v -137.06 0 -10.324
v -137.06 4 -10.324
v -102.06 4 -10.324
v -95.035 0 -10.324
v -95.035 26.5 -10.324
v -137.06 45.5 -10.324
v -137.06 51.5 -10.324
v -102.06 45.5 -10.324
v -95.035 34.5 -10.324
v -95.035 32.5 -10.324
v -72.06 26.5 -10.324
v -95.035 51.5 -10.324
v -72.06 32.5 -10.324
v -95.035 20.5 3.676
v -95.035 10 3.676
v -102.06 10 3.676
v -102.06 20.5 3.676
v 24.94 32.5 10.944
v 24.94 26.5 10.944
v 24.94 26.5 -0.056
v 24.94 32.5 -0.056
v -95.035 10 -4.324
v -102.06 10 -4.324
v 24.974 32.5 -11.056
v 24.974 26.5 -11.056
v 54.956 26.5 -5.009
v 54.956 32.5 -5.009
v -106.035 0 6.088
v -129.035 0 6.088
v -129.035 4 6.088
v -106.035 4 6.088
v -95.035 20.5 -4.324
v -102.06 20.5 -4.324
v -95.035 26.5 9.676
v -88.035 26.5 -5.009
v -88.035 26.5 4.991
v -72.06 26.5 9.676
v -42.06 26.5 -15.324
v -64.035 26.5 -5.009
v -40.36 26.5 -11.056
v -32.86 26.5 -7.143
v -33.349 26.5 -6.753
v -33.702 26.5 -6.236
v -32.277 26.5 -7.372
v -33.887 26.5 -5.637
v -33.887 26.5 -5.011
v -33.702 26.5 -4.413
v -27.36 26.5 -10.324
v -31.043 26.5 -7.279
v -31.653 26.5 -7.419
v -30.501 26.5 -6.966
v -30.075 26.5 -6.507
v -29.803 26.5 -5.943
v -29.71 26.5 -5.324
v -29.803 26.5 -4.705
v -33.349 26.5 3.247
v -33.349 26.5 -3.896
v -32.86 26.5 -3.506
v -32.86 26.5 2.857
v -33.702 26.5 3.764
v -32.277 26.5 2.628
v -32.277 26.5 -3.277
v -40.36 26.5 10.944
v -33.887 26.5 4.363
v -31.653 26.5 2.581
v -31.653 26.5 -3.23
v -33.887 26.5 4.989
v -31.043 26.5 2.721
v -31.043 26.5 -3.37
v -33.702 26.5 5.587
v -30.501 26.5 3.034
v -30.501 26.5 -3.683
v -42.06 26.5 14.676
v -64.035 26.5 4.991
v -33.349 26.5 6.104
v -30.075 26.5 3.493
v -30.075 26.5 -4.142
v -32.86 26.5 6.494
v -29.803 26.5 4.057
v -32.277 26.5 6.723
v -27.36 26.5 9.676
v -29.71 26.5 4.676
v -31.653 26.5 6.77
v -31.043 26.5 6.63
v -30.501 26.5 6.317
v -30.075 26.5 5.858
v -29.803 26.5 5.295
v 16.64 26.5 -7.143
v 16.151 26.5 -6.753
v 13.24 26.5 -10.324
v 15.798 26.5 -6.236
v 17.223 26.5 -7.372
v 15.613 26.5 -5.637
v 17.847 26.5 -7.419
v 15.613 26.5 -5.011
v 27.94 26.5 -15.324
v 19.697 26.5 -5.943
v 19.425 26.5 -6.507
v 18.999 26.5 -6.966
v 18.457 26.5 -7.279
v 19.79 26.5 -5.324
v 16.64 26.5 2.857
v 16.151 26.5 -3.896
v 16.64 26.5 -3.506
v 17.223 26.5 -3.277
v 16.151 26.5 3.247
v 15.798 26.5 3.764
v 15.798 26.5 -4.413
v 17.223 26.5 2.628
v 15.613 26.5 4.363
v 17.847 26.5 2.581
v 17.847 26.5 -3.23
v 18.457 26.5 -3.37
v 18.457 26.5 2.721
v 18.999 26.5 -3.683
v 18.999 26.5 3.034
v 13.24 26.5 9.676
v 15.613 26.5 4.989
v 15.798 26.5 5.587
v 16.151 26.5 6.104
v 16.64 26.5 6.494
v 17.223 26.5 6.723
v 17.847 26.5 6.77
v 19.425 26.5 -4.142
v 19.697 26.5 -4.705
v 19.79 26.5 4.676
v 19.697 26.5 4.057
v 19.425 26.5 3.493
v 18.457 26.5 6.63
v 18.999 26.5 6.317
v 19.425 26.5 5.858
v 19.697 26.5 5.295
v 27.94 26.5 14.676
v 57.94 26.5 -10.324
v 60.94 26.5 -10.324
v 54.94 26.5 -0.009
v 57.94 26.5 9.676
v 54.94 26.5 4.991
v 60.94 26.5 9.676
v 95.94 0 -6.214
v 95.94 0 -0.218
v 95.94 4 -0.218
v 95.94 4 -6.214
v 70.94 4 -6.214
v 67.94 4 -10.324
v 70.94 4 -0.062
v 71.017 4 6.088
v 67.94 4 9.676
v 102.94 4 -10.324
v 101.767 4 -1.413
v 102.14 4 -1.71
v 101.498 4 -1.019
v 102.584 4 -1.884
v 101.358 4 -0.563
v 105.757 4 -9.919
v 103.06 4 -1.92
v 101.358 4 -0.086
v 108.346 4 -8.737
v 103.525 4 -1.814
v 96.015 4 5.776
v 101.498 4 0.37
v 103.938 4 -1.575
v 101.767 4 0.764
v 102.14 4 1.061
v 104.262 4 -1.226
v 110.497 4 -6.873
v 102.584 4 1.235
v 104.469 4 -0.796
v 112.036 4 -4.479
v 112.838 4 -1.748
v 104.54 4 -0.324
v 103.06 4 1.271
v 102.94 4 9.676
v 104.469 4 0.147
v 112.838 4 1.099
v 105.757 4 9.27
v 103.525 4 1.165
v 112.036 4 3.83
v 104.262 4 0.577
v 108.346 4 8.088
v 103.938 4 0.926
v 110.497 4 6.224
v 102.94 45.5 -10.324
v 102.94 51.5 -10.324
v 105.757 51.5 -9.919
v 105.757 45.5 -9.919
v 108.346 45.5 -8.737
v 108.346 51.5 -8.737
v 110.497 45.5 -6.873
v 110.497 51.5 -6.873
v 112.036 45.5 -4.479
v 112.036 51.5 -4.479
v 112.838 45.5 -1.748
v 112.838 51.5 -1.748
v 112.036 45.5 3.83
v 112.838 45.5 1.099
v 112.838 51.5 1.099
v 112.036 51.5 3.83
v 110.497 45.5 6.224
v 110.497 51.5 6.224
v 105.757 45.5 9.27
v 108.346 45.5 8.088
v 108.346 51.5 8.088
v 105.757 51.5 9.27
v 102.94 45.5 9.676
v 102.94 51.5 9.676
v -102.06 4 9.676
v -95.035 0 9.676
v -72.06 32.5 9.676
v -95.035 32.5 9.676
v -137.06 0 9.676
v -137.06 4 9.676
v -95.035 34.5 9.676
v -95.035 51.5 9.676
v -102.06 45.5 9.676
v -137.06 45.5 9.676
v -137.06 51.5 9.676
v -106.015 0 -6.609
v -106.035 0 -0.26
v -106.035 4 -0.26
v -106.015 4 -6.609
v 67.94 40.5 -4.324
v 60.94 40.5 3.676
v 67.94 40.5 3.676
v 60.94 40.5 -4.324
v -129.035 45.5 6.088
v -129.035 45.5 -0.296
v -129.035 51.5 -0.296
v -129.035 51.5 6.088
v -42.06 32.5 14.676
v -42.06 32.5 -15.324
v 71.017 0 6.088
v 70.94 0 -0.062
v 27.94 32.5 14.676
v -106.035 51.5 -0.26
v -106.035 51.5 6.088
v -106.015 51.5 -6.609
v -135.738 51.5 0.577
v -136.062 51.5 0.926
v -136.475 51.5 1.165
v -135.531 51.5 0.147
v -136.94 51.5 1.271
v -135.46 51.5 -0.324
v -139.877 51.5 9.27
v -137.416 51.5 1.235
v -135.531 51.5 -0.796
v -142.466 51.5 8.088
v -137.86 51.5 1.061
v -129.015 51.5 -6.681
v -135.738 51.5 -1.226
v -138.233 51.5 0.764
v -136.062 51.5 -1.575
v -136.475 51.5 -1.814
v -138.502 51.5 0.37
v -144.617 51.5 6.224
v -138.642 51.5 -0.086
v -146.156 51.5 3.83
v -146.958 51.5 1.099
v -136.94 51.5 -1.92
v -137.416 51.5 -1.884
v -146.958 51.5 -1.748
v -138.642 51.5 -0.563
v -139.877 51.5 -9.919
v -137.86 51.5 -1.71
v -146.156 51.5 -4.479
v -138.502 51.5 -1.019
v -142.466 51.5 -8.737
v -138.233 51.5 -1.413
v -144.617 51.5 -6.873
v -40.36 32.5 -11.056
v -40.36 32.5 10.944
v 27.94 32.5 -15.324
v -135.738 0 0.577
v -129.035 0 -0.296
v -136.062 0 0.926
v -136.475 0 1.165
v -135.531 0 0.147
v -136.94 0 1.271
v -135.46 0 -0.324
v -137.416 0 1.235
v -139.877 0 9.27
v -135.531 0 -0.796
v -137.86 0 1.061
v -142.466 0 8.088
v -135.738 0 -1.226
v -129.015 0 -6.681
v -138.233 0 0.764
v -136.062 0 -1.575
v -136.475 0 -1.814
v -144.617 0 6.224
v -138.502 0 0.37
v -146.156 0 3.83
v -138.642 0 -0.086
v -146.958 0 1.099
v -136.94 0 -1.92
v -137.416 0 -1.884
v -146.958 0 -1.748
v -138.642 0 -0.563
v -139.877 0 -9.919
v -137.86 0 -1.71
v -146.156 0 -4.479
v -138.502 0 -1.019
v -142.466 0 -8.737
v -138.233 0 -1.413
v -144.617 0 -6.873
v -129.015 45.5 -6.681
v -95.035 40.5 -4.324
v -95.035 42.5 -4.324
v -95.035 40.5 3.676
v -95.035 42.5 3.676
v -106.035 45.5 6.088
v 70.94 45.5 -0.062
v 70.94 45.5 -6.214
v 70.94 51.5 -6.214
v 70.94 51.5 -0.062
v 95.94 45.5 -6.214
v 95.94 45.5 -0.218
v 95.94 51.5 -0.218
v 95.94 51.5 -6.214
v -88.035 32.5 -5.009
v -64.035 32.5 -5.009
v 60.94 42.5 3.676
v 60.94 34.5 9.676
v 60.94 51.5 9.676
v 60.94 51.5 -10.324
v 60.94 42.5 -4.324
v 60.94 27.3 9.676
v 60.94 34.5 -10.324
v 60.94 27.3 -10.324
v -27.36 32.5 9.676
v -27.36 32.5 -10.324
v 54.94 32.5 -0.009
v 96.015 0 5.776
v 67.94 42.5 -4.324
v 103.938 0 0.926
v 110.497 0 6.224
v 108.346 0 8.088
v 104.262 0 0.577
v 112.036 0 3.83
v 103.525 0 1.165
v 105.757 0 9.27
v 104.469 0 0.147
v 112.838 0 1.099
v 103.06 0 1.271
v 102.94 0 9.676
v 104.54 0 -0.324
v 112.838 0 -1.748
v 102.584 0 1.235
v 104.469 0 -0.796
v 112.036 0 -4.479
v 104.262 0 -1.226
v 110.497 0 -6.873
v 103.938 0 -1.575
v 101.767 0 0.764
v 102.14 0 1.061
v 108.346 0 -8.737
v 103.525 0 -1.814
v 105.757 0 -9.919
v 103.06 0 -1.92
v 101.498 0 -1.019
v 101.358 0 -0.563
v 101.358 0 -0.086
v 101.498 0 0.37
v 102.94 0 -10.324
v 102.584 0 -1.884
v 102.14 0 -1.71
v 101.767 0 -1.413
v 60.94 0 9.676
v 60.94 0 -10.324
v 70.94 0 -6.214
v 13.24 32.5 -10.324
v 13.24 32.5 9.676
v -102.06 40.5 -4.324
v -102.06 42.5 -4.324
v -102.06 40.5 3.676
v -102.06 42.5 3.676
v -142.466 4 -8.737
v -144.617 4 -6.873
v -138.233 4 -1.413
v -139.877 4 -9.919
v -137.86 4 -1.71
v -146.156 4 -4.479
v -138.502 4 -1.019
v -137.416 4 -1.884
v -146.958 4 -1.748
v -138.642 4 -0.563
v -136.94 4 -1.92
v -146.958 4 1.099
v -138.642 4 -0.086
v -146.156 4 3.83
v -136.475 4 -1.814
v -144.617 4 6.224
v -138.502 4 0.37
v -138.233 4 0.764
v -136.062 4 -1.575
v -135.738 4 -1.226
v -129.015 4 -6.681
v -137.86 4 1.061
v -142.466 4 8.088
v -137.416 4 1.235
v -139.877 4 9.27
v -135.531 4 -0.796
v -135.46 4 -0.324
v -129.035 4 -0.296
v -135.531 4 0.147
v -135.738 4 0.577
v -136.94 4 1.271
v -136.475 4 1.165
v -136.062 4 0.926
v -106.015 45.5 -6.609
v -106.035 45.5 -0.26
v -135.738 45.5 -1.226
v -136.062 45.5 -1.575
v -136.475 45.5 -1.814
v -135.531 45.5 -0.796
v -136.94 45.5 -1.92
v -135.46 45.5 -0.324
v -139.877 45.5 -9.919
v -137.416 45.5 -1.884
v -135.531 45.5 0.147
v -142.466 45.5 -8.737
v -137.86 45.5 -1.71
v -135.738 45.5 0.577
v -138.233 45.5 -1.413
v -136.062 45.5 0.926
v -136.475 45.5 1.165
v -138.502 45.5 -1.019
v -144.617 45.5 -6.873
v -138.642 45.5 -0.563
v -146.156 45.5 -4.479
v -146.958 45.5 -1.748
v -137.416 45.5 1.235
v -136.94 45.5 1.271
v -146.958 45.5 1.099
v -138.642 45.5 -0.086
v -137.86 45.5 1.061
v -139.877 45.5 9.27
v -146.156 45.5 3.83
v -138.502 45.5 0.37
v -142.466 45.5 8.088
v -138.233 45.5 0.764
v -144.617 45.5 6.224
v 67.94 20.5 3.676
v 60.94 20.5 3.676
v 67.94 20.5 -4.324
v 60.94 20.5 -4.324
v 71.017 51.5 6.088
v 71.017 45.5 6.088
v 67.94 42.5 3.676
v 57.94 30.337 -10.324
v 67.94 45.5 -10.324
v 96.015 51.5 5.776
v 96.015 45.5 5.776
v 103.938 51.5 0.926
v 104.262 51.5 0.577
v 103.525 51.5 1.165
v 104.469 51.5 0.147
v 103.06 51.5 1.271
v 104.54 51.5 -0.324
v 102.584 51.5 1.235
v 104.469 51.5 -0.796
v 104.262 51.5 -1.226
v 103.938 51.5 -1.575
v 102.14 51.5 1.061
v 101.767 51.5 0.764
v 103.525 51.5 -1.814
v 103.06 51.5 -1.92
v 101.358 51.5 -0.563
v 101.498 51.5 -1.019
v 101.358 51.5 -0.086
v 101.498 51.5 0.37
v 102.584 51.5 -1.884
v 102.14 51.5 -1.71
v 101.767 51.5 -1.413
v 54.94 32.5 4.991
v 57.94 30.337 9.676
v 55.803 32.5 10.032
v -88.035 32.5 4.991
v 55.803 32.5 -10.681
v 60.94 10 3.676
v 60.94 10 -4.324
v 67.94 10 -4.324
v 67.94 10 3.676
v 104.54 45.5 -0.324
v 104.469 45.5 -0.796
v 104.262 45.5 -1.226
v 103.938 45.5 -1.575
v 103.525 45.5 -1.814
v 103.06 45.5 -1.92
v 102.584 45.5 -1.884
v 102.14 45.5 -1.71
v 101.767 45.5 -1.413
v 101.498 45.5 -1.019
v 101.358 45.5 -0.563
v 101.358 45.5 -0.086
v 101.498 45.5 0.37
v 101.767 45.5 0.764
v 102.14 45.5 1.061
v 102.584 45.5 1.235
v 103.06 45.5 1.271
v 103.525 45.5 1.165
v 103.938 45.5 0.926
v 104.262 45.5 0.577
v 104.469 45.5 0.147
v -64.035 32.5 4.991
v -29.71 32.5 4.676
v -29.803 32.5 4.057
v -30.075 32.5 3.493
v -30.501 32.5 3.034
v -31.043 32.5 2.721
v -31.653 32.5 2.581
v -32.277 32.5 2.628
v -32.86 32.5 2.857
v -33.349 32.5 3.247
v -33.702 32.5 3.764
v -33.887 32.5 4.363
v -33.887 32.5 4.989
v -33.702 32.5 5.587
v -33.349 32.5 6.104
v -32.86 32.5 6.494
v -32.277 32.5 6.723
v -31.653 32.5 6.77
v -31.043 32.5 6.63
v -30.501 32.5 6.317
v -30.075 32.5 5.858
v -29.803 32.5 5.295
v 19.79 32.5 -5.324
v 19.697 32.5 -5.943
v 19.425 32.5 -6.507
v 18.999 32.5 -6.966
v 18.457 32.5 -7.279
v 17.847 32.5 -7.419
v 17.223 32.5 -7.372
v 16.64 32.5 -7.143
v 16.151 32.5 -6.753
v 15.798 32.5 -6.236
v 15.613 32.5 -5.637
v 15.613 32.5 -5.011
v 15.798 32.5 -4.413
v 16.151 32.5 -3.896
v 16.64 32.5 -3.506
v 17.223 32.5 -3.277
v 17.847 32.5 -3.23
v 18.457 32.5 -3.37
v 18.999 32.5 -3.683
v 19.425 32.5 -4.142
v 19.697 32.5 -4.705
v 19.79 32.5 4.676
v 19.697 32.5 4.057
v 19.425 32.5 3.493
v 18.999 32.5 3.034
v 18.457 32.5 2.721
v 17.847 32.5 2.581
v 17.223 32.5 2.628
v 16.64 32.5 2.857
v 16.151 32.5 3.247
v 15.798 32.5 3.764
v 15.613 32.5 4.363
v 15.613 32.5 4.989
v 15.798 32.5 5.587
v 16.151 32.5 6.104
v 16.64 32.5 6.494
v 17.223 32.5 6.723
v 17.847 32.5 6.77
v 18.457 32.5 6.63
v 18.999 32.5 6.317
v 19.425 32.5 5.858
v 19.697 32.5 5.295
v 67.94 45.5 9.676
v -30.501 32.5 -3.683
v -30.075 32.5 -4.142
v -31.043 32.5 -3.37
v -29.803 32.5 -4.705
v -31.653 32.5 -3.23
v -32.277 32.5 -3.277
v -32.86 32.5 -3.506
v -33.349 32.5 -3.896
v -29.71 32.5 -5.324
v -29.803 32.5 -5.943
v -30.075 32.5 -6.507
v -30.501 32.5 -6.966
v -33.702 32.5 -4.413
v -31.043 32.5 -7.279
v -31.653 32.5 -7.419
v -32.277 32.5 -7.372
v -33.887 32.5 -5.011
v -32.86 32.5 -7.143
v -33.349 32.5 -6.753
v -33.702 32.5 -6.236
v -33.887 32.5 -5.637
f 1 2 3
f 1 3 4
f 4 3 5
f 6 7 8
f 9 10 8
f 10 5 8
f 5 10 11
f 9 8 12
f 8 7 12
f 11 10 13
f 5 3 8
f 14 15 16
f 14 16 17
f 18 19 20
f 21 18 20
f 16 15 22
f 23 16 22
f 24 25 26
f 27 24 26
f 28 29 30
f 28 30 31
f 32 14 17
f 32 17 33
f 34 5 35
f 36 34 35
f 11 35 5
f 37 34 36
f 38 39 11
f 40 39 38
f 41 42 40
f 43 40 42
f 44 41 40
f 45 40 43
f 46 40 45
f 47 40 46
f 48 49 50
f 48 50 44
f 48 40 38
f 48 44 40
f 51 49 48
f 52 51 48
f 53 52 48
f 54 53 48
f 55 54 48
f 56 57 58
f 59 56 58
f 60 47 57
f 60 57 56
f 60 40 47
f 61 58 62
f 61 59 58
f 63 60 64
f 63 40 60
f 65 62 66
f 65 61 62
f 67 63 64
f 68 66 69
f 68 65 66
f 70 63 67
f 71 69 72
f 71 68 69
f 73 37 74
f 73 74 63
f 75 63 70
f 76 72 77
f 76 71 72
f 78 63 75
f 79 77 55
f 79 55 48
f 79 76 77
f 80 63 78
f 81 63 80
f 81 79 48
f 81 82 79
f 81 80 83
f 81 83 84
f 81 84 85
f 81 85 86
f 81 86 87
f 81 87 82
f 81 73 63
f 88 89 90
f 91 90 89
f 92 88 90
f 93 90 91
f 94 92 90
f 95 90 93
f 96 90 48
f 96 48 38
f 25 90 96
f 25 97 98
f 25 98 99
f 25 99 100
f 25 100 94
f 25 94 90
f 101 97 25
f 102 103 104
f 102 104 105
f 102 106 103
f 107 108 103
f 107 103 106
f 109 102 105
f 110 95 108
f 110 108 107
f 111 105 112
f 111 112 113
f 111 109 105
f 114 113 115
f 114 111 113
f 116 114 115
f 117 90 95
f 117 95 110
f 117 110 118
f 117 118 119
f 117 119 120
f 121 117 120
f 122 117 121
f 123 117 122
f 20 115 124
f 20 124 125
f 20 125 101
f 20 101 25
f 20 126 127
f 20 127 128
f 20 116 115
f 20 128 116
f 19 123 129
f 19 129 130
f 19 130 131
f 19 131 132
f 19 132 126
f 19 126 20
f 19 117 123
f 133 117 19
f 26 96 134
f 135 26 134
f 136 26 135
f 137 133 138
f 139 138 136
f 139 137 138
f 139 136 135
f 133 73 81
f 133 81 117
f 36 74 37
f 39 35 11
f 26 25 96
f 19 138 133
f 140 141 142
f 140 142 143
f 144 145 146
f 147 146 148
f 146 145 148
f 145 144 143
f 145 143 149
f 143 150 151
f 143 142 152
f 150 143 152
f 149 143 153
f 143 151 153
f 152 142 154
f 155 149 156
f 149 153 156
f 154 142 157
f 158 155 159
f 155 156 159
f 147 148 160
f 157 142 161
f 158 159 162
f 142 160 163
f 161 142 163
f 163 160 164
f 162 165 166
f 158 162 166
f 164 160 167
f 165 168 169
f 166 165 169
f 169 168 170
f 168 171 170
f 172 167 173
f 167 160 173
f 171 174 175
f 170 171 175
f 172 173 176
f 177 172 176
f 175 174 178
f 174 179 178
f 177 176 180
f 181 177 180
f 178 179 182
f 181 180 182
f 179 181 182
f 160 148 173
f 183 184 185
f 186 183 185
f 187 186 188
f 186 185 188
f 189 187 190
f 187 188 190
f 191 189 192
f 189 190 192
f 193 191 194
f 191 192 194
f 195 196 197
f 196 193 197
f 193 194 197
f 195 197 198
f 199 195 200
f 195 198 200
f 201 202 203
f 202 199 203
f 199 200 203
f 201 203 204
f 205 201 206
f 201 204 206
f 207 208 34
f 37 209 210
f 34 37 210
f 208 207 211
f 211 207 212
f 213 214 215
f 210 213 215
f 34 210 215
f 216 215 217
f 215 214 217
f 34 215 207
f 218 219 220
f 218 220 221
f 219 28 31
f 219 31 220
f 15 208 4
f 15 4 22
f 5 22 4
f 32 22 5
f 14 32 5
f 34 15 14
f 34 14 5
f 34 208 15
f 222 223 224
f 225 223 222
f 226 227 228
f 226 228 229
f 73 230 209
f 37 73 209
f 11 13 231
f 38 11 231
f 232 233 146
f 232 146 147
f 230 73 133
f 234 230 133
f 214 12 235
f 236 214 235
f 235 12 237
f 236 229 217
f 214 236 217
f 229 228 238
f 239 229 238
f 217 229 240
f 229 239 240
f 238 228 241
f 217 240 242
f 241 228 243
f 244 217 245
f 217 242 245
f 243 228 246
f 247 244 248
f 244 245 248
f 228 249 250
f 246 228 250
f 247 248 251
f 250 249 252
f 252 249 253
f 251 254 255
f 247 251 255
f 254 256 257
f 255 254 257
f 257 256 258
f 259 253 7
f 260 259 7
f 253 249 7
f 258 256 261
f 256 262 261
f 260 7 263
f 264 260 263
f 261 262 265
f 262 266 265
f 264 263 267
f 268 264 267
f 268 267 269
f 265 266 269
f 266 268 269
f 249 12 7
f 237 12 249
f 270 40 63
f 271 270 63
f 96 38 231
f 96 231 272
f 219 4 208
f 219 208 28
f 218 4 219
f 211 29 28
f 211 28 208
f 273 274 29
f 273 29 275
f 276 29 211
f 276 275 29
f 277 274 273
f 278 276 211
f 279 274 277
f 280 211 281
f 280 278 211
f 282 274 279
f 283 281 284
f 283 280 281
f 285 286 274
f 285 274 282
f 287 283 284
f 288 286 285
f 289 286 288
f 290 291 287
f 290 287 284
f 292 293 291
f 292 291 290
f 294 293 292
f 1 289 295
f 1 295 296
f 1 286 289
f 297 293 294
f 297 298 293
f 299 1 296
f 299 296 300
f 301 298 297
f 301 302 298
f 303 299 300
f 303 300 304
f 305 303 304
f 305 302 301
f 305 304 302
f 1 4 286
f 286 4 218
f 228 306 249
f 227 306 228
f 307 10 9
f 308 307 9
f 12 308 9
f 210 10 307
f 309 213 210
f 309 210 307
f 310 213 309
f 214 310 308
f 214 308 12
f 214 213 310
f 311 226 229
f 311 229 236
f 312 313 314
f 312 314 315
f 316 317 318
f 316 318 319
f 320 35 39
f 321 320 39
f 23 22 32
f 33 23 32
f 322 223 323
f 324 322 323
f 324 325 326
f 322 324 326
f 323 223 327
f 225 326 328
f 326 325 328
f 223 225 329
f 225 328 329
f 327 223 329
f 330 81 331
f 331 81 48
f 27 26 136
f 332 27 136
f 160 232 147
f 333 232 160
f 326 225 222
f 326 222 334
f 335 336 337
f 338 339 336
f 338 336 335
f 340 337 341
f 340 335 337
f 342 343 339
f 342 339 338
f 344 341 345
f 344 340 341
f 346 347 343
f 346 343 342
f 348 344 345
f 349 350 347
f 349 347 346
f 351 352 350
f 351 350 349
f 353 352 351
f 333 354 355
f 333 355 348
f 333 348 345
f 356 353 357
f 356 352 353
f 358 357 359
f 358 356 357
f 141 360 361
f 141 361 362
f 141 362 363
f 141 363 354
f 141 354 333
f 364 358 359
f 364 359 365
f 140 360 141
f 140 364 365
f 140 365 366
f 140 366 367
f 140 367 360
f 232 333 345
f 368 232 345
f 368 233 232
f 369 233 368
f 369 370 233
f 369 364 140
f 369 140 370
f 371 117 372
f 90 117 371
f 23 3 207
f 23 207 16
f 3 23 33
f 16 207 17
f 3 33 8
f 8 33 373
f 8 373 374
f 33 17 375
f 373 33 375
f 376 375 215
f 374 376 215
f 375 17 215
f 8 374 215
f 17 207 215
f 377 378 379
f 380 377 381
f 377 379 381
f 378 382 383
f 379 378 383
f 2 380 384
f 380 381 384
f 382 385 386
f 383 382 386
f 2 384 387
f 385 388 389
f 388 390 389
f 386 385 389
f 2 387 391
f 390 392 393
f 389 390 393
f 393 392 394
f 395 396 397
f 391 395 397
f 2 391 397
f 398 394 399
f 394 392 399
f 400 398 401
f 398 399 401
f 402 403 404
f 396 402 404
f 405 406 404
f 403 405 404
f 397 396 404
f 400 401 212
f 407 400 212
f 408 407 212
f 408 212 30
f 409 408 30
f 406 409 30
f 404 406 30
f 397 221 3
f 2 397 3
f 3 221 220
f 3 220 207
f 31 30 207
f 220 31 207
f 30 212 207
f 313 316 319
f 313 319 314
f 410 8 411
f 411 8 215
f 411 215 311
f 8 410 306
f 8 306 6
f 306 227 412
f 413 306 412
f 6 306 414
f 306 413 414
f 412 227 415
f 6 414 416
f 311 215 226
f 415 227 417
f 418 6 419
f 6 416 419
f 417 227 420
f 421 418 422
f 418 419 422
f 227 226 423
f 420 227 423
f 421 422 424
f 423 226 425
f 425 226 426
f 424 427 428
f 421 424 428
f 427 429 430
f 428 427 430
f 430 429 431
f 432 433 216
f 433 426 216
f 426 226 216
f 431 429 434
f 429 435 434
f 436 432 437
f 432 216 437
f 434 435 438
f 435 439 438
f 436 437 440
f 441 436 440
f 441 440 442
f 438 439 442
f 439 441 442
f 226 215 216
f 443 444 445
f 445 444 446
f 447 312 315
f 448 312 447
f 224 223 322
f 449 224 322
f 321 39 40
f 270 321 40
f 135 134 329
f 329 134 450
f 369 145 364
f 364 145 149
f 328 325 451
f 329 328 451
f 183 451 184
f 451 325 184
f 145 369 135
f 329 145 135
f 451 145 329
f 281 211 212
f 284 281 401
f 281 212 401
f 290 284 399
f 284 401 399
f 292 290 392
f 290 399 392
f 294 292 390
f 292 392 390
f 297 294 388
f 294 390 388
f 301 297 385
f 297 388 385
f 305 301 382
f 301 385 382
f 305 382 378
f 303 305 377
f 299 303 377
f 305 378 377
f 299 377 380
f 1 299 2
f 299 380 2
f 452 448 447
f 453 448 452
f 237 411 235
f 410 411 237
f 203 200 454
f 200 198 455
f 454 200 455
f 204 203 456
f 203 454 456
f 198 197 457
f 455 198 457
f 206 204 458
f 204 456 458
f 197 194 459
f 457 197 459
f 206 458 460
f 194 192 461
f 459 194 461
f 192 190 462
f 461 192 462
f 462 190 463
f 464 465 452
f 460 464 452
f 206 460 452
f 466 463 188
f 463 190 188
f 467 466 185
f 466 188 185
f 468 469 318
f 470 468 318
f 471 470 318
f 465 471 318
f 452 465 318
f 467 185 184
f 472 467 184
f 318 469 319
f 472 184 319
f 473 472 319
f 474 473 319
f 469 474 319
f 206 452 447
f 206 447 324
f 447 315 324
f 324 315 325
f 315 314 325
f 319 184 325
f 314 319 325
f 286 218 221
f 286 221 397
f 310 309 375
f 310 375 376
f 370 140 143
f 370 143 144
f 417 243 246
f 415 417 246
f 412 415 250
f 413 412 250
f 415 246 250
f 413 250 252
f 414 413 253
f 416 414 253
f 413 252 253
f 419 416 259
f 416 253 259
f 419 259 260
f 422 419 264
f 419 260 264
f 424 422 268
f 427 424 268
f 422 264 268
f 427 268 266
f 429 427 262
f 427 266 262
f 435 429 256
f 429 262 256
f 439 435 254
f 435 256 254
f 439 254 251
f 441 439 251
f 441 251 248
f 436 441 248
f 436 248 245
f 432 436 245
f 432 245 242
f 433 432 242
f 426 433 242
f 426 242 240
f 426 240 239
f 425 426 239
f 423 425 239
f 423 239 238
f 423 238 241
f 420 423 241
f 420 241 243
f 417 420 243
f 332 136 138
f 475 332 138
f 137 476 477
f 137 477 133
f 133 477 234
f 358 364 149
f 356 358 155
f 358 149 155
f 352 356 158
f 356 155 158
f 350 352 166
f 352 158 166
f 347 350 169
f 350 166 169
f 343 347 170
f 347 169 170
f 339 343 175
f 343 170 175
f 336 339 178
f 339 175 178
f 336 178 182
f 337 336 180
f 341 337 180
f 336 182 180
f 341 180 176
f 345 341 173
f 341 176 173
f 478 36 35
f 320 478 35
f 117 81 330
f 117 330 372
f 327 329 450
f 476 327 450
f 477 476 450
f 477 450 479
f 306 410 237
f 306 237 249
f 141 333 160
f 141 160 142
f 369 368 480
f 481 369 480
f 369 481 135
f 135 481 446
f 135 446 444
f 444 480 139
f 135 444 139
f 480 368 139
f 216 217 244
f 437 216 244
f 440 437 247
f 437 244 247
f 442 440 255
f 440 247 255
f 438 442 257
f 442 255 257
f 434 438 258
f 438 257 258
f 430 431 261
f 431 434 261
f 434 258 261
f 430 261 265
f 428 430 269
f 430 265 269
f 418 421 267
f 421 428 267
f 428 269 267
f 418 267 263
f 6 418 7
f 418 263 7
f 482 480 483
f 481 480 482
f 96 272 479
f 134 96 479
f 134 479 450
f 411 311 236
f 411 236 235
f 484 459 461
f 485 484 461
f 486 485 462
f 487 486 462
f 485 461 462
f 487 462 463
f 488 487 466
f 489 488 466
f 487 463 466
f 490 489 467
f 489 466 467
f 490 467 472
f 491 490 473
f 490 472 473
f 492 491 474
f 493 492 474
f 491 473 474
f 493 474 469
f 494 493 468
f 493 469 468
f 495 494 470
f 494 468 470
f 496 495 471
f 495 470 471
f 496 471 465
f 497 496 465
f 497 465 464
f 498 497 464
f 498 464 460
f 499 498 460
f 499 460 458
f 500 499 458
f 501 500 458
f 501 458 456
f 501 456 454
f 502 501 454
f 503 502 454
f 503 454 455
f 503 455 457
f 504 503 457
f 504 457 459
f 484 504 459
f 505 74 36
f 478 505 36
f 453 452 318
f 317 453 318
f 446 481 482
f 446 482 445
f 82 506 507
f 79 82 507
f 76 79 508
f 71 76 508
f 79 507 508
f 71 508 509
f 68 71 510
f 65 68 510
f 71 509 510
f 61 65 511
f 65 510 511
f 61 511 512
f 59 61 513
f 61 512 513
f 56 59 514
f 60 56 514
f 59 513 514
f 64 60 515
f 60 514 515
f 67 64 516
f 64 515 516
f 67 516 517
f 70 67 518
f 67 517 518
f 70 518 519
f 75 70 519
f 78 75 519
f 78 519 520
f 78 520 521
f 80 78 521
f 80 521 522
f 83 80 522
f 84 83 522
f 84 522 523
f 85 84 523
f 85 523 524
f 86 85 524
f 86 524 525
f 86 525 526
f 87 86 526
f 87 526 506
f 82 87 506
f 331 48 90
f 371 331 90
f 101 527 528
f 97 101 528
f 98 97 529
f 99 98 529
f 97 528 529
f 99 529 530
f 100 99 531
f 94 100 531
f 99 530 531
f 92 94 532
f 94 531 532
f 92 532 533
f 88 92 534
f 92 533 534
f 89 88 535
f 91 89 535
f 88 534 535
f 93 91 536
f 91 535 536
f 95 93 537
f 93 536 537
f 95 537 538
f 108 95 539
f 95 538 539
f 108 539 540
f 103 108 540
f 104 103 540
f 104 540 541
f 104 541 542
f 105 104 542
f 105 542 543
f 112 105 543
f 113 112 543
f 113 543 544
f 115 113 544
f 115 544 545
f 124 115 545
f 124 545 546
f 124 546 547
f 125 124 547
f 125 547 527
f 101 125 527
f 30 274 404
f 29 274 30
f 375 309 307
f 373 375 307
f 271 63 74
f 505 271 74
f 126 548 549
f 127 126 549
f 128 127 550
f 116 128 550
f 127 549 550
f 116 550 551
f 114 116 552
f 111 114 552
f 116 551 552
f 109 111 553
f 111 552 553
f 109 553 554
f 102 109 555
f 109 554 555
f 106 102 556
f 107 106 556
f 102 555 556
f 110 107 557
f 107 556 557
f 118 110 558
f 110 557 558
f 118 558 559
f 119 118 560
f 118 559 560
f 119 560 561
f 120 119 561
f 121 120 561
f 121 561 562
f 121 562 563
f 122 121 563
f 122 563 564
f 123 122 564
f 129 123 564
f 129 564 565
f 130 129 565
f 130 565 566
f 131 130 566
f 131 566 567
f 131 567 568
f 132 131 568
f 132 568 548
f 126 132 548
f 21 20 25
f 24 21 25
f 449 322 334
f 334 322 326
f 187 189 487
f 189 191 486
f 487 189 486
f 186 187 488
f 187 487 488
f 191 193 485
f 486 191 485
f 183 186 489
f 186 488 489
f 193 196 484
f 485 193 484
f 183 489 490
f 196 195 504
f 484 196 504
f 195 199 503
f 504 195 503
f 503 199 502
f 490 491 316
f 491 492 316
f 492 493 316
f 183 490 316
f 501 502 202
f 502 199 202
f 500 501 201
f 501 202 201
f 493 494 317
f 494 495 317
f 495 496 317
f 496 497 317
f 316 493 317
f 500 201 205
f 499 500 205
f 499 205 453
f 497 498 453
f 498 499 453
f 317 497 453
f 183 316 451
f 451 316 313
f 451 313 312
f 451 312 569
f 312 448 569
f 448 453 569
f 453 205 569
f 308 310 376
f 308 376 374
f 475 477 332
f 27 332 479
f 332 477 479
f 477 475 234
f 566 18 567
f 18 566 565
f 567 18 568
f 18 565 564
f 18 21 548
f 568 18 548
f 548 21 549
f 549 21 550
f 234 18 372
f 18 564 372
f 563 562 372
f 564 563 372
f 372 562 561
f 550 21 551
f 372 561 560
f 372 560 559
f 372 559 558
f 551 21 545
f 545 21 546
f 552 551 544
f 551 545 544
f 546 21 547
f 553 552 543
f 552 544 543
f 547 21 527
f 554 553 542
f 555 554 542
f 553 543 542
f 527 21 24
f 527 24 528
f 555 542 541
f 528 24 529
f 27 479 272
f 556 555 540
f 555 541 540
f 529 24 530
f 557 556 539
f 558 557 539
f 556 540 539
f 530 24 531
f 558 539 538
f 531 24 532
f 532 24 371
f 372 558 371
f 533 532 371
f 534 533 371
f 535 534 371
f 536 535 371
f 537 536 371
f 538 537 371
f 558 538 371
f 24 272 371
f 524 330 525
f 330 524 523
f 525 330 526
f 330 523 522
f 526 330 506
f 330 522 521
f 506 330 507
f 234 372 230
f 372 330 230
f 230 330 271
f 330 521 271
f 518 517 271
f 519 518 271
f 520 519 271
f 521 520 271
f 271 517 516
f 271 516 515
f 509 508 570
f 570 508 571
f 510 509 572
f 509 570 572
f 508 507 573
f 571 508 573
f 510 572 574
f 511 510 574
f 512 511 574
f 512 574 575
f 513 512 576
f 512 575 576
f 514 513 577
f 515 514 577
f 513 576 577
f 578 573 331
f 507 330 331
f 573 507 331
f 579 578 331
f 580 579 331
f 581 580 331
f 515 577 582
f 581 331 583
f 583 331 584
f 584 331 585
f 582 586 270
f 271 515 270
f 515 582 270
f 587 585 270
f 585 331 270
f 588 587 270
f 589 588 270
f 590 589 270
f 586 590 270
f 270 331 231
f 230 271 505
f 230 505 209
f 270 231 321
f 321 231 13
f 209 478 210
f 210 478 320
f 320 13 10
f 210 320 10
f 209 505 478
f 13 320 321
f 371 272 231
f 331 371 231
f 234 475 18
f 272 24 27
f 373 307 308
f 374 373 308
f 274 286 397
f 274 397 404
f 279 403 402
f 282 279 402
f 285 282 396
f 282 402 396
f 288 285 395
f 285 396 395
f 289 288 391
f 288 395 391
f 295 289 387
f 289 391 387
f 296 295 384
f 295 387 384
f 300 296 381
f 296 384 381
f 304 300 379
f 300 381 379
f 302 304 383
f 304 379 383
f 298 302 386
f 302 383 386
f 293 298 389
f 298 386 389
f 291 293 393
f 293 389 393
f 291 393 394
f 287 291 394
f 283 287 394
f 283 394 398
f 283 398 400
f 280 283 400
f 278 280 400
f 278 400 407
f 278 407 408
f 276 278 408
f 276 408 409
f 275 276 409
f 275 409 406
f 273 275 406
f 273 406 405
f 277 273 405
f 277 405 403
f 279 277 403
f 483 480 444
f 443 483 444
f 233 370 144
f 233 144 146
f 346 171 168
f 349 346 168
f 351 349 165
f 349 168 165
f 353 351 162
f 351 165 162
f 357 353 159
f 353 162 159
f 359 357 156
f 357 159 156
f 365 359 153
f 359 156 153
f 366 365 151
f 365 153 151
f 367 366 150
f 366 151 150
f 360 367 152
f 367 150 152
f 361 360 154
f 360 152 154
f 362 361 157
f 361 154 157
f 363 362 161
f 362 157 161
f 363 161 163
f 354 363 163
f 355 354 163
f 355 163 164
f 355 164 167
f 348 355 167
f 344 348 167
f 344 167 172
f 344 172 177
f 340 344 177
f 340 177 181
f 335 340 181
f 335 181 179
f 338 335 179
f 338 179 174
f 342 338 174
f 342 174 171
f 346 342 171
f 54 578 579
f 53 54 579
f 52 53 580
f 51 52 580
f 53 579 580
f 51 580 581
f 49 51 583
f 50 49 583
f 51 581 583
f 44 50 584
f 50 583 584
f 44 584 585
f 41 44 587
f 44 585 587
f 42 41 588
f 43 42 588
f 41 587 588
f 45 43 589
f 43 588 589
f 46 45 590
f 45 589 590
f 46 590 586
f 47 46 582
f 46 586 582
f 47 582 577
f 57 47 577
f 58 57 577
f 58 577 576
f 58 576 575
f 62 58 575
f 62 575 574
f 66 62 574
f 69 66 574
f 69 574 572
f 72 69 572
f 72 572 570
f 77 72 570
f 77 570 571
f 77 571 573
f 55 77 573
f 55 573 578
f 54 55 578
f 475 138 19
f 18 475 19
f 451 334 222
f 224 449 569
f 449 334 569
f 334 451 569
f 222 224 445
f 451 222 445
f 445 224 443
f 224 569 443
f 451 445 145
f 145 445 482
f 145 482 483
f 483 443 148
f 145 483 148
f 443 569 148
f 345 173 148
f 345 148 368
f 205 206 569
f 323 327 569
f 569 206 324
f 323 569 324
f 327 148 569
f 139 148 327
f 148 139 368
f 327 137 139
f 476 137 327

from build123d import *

# Parameters (mm, degrees)
SKETCH_1_W                = 70
SKETCH_1_H                = 30
SKETCH_1_W_2              = 40.6
SKETCH_1_H_2              = 20
EXTRUDE_1_DEPTH           = 51.5
SKETCH_2_R                = 2.1
CUT_EXTRUDE_1_DEPTH       = 52.5
SKETCH_3_R                = 1.6
EXTRUDE_2_DEPTH           = 51.5
SKETCH_17_W               = 155.974555081
SKETCH_17_H               = 17
SKETCH_17_H_2             = 26.5
CUT_EXTRUDE_8_DEPTH       = 31
CUT_EXTRUDE_9_DEPTH       = 52.5
SKETCH_20_W               = 8
SKETCH_20_H               = 10.5
SKETCH_20_H_2             = 2
CUT_EXTRUDE_10_DEPTH      = 208.974555081
CUT_EXTRUDE_10_DEPTH_BACK = 53.025444919
CUT_EXTRUDE_11_DEPTH      = 31


with BuildPart() as part:
    # 草图1 → 凸台-拉伸1 (new body)
    with BuildSketch(Plane(origin=(0, 0, 0), x_dir=(1, 0, 0), z_dir=(0, 1, 0))):
        with Locations((-7.06, 0.32447662)):
            Rectangle(SKETCH_1_W, SKETCH_1_H)
        with Locations((-7.06, 0.32447662)):
            Rectangle(SKETCH_1_W_2, SKETCH_1_H_2, mode=Mode.SUBTRACT)
    extrude(amount=EXTRUDE_1_DEPTH)

    # 草图2 → 切除-拉伸1 (cut, through all)
    with BuildSketch(Plane(origin=(0, 51.5, 0), x_dir=(1, 0, 0), z_dir=(0, 1, 0))):
        with Locations((-31.81, 5.32447662)):
            Circle(SKETCH_2_R)
        with Locations((-31.81, -4.67552338)):
            Circle(SKETCH_2_R)
        with Locations((17.69, -4.67552338)):
            Circle(SKETCH_2_R)
        with Locations((17.69, 5.32447662)):
            Circle(SKETCH_2_R)
    extrude(amount=-CUT_EXTRUDE_1_DEPTH, mode=Mode.SUBTRACT)

    # 草图3 → 凸台-拉伸2 (add)
    with BuildSketch(Plane(origin=(0, 51.5, 0), x_dir=(1, 0, 0), z_dir=(0, 1, 0))):
        with BuildLine():
            Line((-137.06, 10.32447662), (-72.06, 10.32447662))
            Line((-72.06, 10.32447662), (-42.06, 15.32447662))
            Line((-42.06, 15.32447662), (-42.06, -14.67552338))
            Line((-42.06, -14.67552338), (-72.06, -9.67552338))
            Line((-72.06, -9.67552338), (-137.06, -9.67552338))
            ThreePointArc((-137.06, -9.67552338), (-147.06, 0.32447662), (-137.06, 10.32447662))
        make_face()
        with Locations((-137.06, 0.32447662)):
            Circle(SKETCH_3_R, mode=Mode.SUBTRACT)
        with BuildLine():
            Line((57.94, 10.32447662), (102.94, 10.32447662))
            ThreePointArc((102.94, 10.32447662), (112.94, 0.32447662), (102.94, -9.67552338))
            Line((102.94, -9.67552338), (57.94, -9.67552338))
            Line((57.94, -9.67552338), (27.94, -14.67552338))
            Line((27.94, -14.67552338), (27.94, 15.32447662))
            Line((27.94, 15.32447662), (57.94, 10.32447662))
        make_face()
        with Locations((102.94, 0.32447662)):
            Circle(SKETCH_3_R, mode=Mode.SUBTRACT)
    extrude(amount=-EXTRUDE_2_DEPTH)

    # 草图17 → 切除-拉伸8 (cut, through all)
    with BuildSketch(Plane.XY.offset(14.67552338)):
        Polygon((112.94, 45.5), (67.94, 45.5), (67.94, 4), (112.94, 4), (117.101410497, 4), (117.101410497, 45.5), align=None)
        Polygon((-147.034555081, 45.5), (-117.034555081, 45.5), (-102.06, 45.5), (-102.06, 25.5), (-102.06, 4), (-117.034555081, 4), (-147.06, 4), (-149.583075769, 4), (-149.583075769, 45.5), align=None)
        with Locations((-17.047277541, 43)):
            Rectangle(SKETCH_17_W, SKETCH_17_H)
        with Locations((-17.047277541, 13.25)):
            Rectangle(SKETCH_17_W, SKETCH_17_H_2)
    extrude(amount=-CUT_EXTRUDE_8_DEPTH, mode=Mode.SUBTRACT)

    # 草图18 → 切除-拉伸9 (cut, through all)
    with BuildSketch(Plane.XZ):
        Polygon((70.94, -6.21374951), (70.94, -0.06239935), (71.016765061, 6.088471801), (96.014818298, 5.776487199), (95.94, -0.218397725), (95.94, -6.21374951), align=None)
        Polygon((-64.034555081, 4.990640098), (-88.034555081, 4.990640098), (-88.034555081, -5.009335567), (-64.034555081, -5.009335567), (-40.36, -11.056105877), (-40.36, 10.943840585), align=None)
        Polygon((54.94, -0.009359902), (54.94, 4.990640098), (24.94, 10.943840585), (24.94, -0.056159415), (24.974319559, -11.056105877), (54.9555998, -5.009335567), align=None)
        Polygon((-106.034555081, 6.088471801), (-106.034555081, -0.260477592), (-106.014746613, -6.609396085), (-129.01463467, -6.681155163), (-129.034555081, -0.296357219), (-129.034555081, 6.088471801), align=None)
    extrude(amount=-CUT_EXTRUDE_9_DEPTH, mode=Mode.SUBTRACT)

    # 草图20 → 切除-拉伸10 (cut, two sides)
    with BuildSketch(Plane(origin=(-95.034555081, 0, 0), x_dir=(0, 0, -1), z_dir=(1, 0, 0))) as cut_extrude_10_sk:
        with Locations((0.32447662, 15.25)):
            Rectangle(SKETCH_20_W, SKETCH_20_H)
        with Locations((0.32447662, 41.5)):
            Rectangle(SKETCH_20_W, SKETCH_20_H_2)
    extrude(amount=CUT_EXTRUDE_10_DEPTH, mode=Mode.SUBTRACT)
    extrude(cut_extrude_10_sk.sketch, amount=-CUT_EXTRUDE_10_DEPTH_BACK, mode=Mode.SUBTRACT)

    # 草图21 → 切除-拉伸11 (cut, through all)
    with BuildSketch(Plane(origin=(0, 0, -15.32447662), x_dir=(-1, 0, 0), z_dir=(0, 0, -1))):
        Polygon((-55.803056083, 32.5), (94.924677091, 32.5), (95.034555081, 32.5), (95.034555081, 34.5), (88.034555081, 34.5), (-60.94, 34.5), (-60.94, 27.3), align=None)
    extrude(amount=-CUT_EXTRUDE_11_DEPTH, mode=Mode.SUBTRACT)


solid = part.part
